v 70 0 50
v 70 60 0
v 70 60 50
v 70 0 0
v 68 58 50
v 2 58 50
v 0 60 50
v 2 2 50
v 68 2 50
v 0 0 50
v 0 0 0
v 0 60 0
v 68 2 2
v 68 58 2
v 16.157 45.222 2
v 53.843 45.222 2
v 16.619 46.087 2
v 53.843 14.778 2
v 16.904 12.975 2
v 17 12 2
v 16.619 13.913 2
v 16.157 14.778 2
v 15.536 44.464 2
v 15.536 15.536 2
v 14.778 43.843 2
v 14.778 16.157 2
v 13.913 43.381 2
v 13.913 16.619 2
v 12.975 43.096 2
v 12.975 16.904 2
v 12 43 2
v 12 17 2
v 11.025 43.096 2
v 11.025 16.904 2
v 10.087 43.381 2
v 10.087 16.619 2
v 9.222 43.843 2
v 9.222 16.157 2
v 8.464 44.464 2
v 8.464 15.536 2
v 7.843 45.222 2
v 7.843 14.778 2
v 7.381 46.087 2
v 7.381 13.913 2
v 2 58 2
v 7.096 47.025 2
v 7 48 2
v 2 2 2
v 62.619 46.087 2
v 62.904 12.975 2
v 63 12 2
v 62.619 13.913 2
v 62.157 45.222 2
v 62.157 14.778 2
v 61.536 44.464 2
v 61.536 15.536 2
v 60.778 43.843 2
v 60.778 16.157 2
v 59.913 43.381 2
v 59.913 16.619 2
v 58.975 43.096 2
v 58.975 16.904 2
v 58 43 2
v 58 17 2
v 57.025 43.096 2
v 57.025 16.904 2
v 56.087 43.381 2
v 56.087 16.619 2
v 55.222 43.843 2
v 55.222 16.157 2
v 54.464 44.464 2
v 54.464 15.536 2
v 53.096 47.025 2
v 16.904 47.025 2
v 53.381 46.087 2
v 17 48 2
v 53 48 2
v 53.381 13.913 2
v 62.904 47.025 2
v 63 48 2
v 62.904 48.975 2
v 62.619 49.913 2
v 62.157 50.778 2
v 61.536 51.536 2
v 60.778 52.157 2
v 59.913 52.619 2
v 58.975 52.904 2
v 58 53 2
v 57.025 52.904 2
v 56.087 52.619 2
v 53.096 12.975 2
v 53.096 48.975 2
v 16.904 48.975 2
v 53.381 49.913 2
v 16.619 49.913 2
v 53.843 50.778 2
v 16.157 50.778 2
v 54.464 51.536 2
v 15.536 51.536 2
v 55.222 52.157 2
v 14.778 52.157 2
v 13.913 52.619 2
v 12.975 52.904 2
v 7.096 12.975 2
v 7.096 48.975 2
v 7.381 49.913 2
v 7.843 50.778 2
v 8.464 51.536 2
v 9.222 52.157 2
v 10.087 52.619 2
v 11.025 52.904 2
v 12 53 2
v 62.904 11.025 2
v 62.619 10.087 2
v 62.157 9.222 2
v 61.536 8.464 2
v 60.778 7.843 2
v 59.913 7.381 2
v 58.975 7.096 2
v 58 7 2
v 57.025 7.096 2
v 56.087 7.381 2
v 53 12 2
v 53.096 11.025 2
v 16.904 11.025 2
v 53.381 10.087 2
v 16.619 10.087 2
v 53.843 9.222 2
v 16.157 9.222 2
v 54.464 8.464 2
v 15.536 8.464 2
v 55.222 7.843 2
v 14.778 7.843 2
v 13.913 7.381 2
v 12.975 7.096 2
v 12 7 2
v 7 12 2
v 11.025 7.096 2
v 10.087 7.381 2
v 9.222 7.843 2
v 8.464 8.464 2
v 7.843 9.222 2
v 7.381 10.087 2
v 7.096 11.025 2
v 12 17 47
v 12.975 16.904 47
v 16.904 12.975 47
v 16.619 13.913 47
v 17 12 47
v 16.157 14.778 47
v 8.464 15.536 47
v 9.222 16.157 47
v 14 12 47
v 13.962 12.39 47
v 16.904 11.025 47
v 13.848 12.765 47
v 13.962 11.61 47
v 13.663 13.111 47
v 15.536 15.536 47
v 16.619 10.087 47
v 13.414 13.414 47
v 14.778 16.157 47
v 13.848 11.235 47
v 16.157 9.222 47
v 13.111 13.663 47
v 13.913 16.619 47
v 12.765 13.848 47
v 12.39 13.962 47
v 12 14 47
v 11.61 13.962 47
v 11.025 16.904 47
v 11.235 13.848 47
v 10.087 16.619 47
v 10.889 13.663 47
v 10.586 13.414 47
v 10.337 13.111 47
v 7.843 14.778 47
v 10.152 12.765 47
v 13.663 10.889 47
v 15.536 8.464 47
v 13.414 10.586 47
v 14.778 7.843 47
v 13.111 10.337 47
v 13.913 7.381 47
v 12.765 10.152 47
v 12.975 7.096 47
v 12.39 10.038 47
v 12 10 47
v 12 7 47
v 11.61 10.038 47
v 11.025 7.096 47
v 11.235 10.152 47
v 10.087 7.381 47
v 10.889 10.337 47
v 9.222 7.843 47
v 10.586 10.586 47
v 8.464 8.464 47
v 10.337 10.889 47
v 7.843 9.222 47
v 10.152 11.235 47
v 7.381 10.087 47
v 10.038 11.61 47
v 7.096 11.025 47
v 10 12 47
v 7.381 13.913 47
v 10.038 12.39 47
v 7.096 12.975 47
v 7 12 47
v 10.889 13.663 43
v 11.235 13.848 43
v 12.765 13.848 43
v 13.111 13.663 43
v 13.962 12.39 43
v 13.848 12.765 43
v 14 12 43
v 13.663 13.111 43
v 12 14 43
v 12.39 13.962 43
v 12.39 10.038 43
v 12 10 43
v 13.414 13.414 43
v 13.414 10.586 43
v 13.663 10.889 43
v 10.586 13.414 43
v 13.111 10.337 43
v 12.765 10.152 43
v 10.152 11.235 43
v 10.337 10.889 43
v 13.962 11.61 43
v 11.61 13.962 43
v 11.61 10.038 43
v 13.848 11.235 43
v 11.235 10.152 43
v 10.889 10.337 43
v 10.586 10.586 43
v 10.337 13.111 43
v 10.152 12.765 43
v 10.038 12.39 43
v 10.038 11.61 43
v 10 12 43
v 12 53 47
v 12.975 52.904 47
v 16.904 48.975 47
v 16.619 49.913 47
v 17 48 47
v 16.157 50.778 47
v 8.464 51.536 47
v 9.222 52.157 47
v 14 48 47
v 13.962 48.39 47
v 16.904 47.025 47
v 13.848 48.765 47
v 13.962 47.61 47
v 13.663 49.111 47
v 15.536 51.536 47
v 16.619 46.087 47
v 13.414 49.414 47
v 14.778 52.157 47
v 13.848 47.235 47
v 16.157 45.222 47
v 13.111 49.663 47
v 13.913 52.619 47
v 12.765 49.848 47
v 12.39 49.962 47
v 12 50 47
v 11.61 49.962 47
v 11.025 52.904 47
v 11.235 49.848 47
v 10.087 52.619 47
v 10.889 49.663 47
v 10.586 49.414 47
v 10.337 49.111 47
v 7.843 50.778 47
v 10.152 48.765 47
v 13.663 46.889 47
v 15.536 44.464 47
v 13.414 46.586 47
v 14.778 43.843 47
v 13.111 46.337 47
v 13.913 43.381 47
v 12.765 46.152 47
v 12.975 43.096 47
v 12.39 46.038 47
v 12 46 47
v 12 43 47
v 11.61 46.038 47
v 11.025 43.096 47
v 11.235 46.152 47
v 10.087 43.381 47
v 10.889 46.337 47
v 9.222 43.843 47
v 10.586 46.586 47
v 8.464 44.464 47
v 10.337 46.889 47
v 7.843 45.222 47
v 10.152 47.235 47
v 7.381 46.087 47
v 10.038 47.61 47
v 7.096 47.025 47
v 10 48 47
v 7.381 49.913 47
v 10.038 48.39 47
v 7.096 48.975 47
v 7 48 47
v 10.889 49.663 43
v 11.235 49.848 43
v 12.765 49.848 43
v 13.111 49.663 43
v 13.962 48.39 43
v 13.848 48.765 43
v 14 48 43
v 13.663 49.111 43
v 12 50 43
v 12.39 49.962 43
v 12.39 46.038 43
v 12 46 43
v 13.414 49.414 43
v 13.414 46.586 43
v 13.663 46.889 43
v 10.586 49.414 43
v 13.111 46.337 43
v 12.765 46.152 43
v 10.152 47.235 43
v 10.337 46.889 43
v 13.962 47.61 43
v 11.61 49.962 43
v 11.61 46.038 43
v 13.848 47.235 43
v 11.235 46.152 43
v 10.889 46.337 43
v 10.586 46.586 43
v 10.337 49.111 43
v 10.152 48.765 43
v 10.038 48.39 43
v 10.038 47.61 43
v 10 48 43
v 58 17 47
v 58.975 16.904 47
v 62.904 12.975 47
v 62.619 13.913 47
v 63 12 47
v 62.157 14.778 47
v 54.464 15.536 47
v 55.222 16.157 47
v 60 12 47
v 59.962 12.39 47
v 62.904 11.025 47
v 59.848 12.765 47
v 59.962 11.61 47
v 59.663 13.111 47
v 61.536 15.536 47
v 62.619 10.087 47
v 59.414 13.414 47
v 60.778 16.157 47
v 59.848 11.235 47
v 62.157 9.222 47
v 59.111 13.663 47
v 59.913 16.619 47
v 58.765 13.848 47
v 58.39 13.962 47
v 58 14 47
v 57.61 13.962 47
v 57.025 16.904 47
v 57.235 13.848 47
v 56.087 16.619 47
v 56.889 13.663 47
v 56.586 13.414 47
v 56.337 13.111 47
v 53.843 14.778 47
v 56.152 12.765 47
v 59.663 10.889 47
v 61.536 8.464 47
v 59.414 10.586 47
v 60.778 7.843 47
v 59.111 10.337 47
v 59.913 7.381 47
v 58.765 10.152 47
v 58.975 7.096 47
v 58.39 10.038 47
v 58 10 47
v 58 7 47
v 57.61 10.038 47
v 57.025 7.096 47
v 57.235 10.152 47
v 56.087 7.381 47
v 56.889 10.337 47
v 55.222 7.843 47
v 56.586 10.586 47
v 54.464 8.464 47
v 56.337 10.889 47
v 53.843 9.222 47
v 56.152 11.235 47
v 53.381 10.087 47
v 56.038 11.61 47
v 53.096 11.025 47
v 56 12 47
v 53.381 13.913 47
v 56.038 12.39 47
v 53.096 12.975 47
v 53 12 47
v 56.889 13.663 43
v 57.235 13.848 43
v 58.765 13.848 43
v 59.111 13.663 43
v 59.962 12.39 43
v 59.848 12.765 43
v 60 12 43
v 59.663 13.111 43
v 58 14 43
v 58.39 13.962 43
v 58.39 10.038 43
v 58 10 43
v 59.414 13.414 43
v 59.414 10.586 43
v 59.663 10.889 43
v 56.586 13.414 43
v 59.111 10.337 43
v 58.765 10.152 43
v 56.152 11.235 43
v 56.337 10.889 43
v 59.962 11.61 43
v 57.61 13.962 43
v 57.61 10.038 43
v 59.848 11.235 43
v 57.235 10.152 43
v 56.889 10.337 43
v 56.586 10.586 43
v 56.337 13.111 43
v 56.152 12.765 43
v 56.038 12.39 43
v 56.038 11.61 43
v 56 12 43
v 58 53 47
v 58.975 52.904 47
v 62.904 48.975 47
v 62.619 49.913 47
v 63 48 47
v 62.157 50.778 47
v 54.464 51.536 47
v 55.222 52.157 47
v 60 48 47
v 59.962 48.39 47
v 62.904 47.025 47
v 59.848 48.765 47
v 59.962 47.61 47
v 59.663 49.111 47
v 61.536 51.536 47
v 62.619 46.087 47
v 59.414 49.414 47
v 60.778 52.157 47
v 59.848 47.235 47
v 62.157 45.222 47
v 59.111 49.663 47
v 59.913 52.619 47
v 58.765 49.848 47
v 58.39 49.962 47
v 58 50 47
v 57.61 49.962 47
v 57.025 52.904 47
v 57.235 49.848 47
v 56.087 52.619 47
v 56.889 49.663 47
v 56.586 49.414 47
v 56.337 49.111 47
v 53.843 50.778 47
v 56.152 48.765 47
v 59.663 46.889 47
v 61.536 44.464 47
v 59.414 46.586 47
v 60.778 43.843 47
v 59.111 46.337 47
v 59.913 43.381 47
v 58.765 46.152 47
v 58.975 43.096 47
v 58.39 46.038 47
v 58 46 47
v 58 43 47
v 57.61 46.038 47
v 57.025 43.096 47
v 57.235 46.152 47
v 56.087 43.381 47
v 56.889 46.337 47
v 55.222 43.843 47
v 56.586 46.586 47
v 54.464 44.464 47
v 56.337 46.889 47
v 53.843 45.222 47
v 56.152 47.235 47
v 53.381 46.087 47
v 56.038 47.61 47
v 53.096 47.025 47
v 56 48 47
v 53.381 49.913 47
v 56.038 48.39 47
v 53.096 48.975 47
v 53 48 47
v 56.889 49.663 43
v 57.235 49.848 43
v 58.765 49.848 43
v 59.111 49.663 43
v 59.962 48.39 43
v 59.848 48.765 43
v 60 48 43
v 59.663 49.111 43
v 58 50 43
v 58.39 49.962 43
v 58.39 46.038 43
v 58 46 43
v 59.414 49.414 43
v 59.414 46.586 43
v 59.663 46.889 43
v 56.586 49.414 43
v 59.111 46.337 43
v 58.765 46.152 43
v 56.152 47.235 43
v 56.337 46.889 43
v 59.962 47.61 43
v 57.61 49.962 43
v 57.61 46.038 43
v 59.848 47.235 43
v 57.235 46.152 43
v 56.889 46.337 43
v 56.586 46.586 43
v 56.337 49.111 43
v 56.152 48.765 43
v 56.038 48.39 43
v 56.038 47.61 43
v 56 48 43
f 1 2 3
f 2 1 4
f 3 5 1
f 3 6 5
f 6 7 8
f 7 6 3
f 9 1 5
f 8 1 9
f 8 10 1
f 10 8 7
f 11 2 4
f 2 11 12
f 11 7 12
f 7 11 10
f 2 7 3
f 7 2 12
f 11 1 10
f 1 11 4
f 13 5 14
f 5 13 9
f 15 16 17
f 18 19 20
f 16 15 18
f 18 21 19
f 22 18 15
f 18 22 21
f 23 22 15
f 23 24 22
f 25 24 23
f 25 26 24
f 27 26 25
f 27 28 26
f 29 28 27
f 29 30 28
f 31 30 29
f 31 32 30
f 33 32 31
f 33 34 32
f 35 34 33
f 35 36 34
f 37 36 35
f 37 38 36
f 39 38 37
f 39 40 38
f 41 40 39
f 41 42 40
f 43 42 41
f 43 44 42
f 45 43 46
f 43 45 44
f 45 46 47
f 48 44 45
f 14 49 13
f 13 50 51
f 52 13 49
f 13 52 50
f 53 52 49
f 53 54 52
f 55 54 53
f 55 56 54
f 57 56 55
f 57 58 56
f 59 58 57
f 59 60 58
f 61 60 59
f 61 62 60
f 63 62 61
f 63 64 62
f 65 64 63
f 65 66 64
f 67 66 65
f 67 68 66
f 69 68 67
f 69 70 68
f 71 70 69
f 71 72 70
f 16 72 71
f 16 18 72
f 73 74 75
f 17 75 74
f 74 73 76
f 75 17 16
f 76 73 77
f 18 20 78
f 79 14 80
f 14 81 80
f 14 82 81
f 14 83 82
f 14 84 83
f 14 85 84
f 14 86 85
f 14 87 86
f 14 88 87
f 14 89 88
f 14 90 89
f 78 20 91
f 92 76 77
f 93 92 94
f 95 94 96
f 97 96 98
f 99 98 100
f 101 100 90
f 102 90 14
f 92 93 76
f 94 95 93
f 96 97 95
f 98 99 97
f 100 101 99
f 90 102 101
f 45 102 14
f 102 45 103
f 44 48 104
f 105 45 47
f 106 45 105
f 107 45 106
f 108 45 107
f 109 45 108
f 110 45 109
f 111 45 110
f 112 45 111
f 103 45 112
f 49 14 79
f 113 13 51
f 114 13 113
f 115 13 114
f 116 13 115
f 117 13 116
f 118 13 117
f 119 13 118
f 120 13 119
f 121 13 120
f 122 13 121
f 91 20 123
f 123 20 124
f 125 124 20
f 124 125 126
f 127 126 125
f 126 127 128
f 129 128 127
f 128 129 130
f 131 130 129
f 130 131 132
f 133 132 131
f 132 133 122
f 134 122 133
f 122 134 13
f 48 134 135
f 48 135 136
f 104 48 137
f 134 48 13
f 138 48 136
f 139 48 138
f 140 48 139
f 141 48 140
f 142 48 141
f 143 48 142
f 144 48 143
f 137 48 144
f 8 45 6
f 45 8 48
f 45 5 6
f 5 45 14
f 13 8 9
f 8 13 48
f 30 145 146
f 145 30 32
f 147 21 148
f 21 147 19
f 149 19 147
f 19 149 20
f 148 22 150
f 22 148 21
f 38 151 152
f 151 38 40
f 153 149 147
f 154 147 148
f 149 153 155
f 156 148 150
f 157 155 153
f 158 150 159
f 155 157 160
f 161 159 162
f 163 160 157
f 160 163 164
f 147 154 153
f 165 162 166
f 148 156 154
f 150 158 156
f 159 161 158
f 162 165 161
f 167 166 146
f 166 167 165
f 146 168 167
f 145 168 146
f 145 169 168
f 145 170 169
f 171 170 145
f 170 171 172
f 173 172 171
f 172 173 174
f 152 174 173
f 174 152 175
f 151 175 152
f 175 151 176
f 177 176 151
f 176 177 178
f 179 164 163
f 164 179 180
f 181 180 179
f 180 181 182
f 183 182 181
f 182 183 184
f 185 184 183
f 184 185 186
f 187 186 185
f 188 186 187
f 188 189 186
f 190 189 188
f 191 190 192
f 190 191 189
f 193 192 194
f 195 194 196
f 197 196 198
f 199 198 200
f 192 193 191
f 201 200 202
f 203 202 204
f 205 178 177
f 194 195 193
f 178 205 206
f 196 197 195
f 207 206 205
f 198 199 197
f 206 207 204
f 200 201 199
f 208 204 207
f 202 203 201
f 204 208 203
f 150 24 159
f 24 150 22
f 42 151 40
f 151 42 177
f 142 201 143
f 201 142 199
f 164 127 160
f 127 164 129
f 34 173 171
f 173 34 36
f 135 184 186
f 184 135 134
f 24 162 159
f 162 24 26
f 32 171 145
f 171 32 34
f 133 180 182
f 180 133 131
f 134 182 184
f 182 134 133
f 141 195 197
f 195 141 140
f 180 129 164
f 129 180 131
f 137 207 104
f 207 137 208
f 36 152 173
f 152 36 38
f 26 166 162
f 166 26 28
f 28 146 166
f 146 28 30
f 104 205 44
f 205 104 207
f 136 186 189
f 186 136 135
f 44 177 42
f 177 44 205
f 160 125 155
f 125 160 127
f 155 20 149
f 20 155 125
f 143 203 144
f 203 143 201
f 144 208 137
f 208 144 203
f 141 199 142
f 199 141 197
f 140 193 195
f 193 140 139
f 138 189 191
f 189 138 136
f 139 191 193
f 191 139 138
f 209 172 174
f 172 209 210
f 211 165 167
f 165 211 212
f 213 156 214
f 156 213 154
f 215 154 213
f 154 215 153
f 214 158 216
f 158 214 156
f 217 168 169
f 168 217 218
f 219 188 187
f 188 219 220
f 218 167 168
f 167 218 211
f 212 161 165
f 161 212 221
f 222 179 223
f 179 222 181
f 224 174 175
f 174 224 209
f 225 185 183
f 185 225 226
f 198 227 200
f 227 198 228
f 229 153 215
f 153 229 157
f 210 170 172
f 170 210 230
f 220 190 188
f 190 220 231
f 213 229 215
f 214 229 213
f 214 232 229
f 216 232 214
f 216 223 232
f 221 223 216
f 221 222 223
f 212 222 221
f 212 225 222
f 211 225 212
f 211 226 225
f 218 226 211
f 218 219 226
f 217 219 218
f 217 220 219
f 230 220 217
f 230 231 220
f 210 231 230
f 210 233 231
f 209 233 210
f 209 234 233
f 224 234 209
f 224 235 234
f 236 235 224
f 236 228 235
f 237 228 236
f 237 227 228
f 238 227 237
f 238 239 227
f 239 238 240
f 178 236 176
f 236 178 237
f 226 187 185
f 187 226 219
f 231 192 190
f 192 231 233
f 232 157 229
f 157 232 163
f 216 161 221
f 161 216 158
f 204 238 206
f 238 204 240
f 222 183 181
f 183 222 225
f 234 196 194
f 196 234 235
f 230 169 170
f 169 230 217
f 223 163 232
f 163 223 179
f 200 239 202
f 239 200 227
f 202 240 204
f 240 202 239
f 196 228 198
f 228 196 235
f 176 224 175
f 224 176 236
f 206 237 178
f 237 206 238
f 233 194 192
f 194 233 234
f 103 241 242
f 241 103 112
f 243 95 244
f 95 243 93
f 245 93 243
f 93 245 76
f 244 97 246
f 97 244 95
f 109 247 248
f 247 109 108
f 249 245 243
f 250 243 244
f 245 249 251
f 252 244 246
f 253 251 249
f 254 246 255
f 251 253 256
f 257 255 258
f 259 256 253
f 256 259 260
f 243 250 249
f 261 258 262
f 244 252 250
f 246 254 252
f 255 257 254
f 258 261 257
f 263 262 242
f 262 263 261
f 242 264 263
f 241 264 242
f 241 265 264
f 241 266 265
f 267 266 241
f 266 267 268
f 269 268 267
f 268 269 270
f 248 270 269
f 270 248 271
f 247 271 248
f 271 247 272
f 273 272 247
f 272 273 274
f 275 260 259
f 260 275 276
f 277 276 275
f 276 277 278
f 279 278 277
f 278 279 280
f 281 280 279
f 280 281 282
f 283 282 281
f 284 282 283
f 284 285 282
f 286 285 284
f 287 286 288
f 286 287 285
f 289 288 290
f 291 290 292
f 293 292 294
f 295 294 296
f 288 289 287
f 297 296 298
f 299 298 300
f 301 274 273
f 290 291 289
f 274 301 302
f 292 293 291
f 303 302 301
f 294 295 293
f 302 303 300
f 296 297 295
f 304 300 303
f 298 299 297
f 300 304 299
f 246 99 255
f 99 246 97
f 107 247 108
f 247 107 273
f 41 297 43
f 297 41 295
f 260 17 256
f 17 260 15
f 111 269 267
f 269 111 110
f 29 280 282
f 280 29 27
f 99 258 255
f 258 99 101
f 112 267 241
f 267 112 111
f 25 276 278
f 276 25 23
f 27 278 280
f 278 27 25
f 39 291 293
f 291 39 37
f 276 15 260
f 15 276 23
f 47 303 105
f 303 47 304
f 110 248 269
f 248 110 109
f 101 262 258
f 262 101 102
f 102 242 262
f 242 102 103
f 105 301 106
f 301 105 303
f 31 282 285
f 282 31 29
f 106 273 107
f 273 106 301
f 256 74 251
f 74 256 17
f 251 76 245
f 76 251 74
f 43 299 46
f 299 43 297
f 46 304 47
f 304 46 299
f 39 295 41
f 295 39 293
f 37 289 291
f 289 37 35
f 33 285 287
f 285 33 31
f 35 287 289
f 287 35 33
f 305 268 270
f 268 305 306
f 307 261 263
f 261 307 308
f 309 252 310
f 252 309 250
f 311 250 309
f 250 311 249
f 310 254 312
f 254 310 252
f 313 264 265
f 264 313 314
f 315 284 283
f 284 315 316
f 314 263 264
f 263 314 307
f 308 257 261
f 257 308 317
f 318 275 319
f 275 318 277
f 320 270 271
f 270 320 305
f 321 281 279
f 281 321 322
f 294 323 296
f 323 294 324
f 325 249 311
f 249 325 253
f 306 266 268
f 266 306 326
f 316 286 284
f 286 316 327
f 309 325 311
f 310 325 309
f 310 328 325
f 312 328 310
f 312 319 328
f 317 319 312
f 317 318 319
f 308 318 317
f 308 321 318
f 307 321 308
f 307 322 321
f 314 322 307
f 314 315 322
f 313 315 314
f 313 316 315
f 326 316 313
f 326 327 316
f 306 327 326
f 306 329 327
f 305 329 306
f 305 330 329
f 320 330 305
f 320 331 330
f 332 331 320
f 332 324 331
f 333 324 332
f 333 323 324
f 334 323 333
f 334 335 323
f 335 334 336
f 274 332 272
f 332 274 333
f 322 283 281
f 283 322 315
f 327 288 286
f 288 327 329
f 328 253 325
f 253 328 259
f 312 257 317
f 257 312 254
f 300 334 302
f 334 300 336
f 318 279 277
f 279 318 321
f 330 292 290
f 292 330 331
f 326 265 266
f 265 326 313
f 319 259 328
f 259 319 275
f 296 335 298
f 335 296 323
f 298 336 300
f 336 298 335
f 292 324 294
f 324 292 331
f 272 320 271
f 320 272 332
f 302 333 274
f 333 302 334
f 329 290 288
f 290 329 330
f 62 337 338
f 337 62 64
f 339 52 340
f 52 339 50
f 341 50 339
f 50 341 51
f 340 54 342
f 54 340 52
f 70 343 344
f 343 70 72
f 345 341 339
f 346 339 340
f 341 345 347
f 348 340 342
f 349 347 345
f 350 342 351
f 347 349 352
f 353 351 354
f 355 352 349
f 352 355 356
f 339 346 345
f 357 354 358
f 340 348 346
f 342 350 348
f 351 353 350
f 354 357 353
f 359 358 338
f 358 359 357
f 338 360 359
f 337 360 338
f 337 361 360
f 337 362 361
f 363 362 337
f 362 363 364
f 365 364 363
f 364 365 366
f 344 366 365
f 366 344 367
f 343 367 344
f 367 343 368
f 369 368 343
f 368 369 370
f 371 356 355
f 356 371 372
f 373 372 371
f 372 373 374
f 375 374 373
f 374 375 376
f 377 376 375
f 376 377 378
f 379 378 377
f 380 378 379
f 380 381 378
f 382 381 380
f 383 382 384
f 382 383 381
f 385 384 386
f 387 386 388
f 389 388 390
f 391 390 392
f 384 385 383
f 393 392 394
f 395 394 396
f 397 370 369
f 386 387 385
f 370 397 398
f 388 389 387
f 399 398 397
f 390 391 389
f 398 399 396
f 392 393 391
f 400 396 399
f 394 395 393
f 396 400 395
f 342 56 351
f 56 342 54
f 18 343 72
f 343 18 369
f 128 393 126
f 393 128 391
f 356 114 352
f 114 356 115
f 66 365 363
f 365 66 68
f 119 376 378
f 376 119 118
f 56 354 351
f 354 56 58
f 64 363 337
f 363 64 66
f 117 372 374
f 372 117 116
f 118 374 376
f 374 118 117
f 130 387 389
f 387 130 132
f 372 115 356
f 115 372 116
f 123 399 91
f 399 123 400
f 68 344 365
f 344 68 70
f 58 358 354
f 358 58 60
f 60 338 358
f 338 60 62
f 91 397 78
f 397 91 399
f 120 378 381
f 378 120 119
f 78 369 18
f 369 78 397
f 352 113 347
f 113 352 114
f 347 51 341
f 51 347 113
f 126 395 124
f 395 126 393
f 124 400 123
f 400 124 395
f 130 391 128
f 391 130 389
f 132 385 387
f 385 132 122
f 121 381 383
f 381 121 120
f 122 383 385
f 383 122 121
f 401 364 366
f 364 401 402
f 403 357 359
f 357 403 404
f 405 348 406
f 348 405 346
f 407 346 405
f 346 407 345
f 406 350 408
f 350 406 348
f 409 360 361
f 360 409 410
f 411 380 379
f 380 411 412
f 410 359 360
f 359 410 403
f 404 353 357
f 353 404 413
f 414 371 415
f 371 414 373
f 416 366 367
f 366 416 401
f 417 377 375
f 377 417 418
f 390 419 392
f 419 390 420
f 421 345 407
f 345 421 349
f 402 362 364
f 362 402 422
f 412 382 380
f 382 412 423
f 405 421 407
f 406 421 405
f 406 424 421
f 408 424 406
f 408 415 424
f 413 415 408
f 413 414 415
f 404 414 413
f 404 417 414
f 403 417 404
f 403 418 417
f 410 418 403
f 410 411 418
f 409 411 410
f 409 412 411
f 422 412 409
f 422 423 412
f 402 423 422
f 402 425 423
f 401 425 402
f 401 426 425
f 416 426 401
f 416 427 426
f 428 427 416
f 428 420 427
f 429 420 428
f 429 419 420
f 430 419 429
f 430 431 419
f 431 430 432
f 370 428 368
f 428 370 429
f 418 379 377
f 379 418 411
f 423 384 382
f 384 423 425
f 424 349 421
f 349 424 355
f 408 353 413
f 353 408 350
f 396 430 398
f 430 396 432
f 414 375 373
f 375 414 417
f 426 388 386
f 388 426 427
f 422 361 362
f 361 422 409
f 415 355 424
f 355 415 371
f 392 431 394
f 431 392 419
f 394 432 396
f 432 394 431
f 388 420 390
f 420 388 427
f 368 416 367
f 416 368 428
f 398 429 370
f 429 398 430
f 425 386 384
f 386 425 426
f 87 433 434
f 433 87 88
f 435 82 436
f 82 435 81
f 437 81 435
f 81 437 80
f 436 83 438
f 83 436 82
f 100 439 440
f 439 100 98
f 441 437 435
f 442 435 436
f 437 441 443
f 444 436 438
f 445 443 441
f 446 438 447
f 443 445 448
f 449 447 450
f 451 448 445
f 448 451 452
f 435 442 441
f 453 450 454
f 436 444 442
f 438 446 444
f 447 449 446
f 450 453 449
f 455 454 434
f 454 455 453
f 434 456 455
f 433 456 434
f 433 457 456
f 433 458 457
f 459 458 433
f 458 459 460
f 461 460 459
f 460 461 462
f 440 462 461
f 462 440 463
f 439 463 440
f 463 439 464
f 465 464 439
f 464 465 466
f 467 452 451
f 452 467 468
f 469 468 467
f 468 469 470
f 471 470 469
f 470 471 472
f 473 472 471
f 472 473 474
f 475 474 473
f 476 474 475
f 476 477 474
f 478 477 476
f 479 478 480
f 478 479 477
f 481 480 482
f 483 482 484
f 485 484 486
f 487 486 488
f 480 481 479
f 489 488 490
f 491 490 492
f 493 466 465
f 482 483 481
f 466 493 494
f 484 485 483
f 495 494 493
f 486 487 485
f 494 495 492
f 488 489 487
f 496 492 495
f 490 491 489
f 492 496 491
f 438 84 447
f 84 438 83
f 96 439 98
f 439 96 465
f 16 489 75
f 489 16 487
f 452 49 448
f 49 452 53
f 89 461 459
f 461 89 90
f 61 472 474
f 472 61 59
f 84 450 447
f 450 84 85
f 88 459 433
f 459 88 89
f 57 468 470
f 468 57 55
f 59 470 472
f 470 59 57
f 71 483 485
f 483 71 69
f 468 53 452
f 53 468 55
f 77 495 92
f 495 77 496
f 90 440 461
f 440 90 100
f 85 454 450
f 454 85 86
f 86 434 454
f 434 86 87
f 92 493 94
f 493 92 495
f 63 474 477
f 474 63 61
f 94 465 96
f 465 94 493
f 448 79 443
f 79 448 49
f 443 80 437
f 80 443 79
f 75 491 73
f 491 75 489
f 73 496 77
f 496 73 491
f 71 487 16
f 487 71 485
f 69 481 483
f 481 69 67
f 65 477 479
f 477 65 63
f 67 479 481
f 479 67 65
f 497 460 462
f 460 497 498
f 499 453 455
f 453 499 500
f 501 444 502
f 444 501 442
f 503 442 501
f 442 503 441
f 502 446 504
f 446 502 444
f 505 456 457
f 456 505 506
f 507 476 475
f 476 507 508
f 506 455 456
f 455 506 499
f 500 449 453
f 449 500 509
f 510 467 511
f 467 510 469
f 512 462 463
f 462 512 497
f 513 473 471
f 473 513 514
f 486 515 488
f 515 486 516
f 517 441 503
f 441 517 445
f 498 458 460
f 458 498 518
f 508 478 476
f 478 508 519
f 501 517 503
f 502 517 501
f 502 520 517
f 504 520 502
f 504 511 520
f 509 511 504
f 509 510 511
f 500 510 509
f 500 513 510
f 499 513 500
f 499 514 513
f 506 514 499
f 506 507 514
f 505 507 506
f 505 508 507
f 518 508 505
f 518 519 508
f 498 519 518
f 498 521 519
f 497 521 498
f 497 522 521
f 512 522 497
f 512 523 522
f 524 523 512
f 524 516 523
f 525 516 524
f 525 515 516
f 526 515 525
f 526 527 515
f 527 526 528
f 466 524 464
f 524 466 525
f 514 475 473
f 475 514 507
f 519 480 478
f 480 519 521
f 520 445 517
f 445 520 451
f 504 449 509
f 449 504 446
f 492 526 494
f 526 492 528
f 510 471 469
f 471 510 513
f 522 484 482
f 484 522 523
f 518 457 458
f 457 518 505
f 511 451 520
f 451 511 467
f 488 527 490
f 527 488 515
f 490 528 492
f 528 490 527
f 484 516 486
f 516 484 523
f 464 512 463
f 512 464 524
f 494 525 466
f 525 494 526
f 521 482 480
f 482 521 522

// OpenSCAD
$fn = 32;

// ----------------------------------------------------------------------
// Enclosure box: bosses enclosure
// ----------------------------------------------------------------------

// --- parameters (mm) ---
box_l = 70;               // outer length, X
box_w = 60;               // outer width, Y
box_h = 50;               // outer height
wall_t = 2;               // wall thickness
boss_r = 5;               // corner boss radius
hole_r = 2;               // boss screw hole radius
boss_in = 12;             // boss inset from the corners

inner_h = box_h - wall_t;  // cavity depth
boss_h = inner_h - 2;  // corner boss height

difference() {
  union() {
    difference() {
      cube([box_l, box_w, box_h]);
      translate([wall_t, wall_t, wall_t])
        cube([box_l - 2 * wall_t, box_w - 2 * wall_t, box_h]);
    }
    for (sx = [0, 1], sy = [0, 1])
      translate([sx ? box_l - boss_in : boss_in,
                 sy ? box_w - boss_in : boss_in, wall_t - 1])
        difference() {
          cylinder(r = boss_r, h = boss_h);
          translate([0, 0, boss_h - 4])
            cylinder(r = hole_r, h = 5);
        }
  }
}
